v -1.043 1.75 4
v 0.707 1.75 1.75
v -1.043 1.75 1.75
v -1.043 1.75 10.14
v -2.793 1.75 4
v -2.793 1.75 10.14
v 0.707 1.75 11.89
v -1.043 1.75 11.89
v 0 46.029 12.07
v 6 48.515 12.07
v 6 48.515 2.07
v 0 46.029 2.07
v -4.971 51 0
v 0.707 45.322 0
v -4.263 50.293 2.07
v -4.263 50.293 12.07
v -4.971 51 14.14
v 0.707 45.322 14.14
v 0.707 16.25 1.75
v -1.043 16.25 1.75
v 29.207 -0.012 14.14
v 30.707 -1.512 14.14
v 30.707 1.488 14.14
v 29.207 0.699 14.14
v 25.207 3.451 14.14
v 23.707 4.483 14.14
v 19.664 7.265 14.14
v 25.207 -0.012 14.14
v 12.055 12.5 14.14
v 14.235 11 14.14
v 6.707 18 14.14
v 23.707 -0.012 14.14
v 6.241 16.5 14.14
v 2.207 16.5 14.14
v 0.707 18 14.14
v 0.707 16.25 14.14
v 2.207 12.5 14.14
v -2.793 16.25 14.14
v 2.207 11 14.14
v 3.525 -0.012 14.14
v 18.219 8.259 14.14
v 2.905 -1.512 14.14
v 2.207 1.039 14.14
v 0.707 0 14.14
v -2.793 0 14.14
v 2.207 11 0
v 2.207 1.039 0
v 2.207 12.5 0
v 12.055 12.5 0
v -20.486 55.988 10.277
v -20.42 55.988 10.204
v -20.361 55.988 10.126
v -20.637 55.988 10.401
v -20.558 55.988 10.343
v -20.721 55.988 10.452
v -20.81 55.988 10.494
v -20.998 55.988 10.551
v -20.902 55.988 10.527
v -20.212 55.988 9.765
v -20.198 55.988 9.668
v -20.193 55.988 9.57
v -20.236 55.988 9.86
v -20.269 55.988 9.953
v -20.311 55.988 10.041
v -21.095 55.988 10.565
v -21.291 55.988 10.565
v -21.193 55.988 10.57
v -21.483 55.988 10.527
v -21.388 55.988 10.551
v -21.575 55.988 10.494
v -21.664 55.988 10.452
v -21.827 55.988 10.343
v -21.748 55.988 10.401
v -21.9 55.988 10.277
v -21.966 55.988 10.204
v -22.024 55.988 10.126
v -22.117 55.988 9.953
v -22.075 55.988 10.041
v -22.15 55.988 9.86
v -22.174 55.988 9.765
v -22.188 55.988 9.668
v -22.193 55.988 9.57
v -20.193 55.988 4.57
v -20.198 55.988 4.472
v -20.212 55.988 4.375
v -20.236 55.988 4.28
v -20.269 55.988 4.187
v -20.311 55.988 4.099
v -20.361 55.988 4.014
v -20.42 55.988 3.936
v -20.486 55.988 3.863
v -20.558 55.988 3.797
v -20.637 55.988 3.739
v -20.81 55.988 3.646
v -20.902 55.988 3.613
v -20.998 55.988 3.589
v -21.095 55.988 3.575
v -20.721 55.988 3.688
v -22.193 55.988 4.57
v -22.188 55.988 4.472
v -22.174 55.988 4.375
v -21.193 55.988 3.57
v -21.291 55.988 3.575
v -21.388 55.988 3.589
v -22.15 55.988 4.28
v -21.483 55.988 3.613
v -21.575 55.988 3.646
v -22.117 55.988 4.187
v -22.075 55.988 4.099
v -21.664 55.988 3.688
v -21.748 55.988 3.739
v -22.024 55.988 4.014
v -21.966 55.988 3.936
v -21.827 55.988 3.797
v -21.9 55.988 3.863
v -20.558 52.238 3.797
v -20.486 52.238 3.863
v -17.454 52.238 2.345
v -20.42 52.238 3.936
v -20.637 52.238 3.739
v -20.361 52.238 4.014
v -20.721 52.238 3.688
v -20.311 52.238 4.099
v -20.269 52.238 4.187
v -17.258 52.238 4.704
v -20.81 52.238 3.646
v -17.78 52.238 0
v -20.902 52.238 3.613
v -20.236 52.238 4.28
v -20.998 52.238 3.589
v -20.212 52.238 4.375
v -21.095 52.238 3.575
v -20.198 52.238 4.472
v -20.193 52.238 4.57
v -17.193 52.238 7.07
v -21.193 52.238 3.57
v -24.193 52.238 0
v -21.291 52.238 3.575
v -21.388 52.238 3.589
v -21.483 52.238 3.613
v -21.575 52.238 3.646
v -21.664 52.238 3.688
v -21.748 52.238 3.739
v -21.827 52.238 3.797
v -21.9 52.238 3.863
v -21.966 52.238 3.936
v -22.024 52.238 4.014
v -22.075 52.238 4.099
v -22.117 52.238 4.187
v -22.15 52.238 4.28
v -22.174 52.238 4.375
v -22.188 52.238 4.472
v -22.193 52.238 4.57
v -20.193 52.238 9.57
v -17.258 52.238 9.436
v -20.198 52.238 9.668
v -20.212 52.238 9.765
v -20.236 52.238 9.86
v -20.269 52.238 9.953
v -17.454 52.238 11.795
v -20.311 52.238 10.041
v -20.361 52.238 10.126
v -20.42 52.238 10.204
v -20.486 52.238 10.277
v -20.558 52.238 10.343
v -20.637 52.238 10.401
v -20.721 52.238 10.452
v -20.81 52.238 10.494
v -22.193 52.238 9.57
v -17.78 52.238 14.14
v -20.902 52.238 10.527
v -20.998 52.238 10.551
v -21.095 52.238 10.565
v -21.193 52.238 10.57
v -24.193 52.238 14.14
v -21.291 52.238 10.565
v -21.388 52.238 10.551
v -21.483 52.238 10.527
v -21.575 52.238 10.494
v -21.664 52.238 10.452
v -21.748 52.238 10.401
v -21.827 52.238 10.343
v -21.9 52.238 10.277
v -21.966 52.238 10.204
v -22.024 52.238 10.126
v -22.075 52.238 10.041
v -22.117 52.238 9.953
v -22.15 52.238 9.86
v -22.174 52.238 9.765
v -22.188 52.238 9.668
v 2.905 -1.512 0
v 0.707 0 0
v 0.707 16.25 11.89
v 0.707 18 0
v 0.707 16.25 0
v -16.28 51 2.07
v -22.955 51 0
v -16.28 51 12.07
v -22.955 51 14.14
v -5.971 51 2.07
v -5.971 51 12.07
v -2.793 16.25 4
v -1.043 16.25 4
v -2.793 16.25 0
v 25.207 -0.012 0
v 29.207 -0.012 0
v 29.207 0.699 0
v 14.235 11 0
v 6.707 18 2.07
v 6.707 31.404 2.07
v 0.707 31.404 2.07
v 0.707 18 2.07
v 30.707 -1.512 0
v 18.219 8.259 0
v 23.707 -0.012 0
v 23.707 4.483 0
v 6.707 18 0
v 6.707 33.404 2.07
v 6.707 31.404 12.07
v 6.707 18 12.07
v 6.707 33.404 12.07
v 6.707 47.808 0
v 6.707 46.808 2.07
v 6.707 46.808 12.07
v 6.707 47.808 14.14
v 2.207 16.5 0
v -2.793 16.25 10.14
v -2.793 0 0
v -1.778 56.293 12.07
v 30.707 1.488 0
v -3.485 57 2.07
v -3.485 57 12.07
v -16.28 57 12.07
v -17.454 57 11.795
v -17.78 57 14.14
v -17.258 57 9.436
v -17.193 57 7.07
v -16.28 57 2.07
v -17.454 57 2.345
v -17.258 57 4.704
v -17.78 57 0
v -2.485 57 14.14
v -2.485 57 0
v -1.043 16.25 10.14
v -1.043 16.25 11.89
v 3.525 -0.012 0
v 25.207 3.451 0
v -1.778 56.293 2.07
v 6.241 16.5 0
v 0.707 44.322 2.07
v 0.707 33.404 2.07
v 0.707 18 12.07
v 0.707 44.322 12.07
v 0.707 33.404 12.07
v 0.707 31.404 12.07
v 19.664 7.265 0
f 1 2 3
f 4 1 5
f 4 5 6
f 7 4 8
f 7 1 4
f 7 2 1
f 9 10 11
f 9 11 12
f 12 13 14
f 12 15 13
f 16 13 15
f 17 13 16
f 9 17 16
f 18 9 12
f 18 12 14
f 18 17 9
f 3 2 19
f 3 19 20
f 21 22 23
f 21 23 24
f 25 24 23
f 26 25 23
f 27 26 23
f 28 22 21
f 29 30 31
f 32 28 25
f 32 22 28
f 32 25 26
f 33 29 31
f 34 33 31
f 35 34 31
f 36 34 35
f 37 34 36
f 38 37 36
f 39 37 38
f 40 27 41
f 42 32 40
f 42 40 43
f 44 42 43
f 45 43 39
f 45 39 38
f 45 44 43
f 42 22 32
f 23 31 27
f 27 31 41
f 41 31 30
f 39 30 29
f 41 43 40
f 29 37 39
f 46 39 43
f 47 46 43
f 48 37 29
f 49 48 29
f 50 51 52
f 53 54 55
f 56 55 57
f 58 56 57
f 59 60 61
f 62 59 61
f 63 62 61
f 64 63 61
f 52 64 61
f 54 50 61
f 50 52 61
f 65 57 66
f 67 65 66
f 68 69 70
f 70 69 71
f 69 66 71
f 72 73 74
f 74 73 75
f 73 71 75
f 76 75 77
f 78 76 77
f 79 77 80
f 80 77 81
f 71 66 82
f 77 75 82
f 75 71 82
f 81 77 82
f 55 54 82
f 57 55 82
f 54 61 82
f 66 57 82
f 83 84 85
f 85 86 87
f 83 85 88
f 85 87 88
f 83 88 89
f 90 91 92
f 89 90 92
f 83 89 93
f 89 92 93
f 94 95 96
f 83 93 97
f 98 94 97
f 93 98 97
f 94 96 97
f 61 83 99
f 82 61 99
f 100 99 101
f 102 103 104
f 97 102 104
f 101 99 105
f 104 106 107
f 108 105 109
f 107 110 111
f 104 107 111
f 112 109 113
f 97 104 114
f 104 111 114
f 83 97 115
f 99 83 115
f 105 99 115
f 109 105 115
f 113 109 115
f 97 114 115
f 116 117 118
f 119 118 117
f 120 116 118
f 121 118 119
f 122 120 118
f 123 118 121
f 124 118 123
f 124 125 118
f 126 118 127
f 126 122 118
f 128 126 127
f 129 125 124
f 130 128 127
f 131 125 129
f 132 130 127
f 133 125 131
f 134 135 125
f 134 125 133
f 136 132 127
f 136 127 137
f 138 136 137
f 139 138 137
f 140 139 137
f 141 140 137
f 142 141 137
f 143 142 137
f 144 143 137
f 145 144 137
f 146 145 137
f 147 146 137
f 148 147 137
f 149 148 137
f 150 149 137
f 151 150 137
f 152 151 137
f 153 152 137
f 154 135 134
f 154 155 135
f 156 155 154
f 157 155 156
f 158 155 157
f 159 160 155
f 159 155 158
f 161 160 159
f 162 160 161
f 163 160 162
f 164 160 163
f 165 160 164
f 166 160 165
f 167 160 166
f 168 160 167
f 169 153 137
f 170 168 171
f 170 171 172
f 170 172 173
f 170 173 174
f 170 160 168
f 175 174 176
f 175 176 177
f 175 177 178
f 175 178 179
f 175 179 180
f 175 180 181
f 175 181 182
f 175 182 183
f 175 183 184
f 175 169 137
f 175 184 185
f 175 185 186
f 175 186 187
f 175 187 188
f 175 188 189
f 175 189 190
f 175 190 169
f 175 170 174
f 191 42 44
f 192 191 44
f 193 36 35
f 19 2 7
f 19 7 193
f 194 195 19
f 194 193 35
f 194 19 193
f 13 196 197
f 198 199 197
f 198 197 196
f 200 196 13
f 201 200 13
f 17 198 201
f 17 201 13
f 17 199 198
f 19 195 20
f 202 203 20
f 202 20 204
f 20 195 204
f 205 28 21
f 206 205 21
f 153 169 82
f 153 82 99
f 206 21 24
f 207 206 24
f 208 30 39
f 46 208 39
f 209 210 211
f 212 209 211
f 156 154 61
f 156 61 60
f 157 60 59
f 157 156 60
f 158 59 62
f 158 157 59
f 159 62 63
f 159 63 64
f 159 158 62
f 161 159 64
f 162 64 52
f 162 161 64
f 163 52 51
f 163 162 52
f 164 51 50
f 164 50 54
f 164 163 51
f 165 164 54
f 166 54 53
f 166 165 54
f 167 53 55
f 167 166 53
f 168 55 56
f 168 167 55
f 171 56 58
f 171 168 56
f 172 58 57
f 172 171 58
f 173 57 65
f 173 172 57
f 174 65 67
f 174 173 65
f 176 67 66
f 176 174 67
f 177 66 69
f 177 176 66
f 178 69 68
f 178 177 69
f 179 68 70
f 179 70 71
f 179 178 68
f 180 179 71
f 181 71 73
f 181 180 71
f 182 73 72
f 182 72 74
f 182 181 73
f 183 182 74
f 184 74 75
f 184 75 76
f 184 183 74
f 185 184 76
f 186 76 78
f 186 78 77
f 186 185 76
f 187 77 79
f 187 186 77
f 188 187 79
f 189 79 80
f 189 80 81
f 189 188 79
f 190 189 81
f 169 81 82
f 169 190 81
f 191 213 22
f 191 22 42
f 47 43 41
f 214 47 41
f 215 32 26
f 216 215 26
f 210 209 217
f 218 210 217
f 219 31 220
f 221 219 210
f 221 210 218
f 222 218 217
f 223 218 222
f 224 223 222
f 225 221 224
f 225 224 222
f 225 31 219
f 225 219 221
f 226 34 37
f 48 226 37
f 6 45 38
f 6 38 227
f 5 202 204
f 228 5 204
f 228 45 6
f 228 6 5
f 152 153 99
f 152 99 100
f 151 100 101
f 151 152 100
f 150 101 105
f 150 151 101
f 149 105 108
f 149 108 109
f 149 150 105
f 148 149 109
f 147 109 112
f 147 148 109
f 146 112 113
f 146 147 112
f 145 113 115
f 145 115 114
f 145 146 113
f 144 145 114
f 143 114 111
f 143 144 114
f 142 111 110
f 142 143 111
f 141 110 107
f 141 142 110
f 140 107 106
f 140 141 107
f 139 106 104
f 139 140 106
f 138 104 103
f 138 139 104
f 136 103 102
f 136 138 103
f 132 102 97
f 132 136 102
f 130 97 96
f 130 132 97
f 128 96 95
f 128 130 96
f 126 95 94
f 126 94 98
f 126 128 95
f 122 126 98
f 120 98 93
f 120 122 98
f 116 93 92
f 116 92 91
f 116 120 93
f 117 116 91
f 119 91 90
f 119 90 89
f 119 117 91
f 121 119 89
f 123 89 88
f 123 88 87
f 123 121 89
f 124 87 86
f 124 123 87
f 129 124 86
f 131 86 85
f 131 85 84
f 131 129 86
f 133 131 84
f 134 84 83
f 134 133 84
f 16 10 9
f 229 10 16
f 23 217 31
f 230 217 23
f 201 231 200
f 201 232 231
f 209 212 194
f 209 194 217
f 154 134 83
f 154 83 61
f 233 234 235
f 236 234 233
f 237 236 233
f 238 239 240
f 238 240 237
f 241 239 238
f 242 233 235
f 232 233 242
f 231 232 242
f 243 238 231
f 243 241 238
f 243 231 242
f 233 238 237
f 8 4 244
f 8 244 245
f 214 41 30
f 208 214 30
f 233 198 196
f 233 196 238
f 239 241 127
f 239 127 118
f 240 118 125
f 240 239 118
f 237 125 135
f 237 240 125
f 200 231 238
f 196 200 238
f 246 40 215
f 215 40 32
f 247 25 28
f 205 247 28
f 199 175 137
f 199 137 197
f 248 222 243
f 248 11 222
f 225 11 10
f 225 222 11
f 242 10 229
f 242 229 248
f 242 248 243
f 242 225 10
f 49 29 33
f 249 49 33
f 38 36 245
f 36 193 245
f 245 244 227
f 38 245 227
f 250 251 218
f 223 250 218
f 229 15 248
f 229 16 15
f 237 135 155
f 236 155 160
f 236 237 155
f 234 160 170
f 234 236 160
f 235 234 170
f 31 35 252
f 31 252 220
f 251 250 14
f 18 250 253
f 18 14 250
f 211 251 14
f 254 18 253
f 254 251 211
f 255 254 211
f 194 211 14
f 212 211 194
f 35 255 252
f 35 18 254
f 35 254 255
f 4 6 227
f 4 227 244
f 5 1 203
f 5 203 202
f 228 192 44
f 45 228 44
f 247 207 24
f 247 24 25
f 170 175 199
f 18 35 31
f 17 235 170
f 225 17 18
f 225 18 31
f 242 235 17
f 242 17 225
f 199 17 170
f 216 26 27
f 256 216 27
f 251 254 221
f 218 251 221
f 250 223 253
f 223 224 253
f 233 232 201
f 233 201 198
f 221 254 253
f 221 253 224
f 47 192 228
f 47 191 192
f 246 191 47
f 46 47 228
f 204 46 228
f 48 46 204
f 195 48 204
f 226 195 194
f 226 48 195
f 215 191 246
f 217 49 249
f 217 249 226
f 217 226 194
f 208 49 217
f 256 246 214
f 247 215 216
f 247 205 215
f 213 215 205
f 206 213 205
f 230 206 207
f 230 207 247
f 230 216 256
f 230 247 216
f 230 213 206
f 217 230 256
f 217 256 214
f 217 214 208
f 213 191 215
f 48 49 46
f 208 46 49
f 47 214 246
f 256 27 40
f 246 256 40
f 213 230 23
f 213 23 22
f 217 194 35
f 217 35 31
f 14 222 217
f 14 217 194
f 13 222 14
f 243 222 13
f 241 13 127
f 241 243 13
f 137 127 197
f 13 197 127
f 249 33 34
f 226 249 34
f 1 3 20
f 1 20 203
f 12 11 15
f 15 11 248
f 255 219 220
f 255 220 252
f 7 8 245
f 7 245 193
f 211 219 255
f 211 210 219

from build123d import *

# Parameters (mm, degrees)
BOSS_EXTRUDE1_DEPTH = 14.14
CUT_EXTRUDE1_REACH  = 40.3
BOSS_EXTRUDE2_DEPTH = 14.14
BOSS_EXTRUDE8_REACH = 69.576
BOSS_EXTRUDE5_DEPTH = 3.75
SKETCH10_W          = 14.14
SKETCH10_H          = 1.75
BOSS_EXTRUDE6_DEPTH = 3.5
BOSS_EXTRUDE7_DEPTH = 14.5
SKETCH15_W          = 6
SKETCH15_H          = 13.403805922
CUT_EXTRUDE7_DEPTH  = 5


with BuildPart() as part:
    # Sketch1 → Boss-Extrude1 (new body)
    with BuildSketch(Plane.XY):
        Polygon((0.707106781, 0), (0.707106781, 18), (6.707106781, 18), (30.707106781, 1.488209222), (30.707106781, -1.511790778), (2.904504941, -1.511790778), align=None)
    extrude(amount=BOSS_EXTRUDE1_DEPTH)

    # Sketch2 → Cut-Extrude1 (cut, up to next)
    with BuildSketch(Plane.XY.offset(14.14), mode=Mode.PRIVATE) as cut_extrude1_sk1:
        Polygon((2.207106781, 16.5), (2.207106781, 12.5), (12.054974944, 12.5), (6.240947786, 16.5), align=None)
    cut_extrude1_tool1 = extrude(cut_extrude1_sk1.sketch, amount=-CUT_EXTRUDE1_REACH, mode=Mode.PRIVATE) & part.part
    # Sketch2 → Cut-Extrude1 (cut, up to next)
    with BuildSketch(Plane.XY.offset(14.14), mode=Mode.PRIVATE) as cut_extrude1_sk2:
        Polygon((14.235235128, 11), (2.207106781, 11), (2.207106781, 1.039488327), (18.219044647, 8.25917378), align=None)
    cut_extrude1_tool2 = extrude(cut_extrude1_sk2.sketch, amount=-CUT_EXTRUDE1_REACH, mode=Mode.PRIVATE) & part.part
    # Sketch2 → Cut-Extrude1 (cut, up to next)
    with BuildSketch(Plane.XY.offset(14.14), mode=Mode.PRIVATE) as cut_extrude1_sk3:
        Polygon((23.707106781, 4.483434874), (19.663816354, 7.265183441), (3.524822517, -0.011790778), (23.707106781, -0.011790778), align=None)
    cut_extrude1_tool3 = extrude(cut_extrude1_sk3.sketch, amount=-CUT_EXTRUDE1_REACH, mode=Mode.PRIVATE) & part.part
    # Sketch2 → Cut-Extrude1 (cut, up to next)
    with BuildSketch(Plane.XY.offset(14.14), mode=Mode.PRIVATE) as cut_extrude1_sk4:
        Polygon((29.207106781, 0.699482821), (25.207106781, 3.451447951), (25.207106781, -0.011790778), (29.207106781, -0.011790778), align=None)
    cut_extrude1_tool4 = extrude(cut_extrude1_sk4.sketch, amount=-CUT_EXTRUDE1_REACH, mode=Mode.PRIVATE) & part.part
    add(cut_extrude1_tool1.solids().sort_by_distance((5.880456, 14.220782, 14.14))[0], mode=Mode.SUBTRACT)
    add(cut_extrude1_tool2.solids().sort_by_distance((8.231218, 7.334959, 14.14))[0], mode=Mode.SUBTRACT)
    add(cut_extrude1_tool3.solids().sort_by_distance((16.372786, 2.578882, 14.14))[0], mode=Mode.SUBTRACT)
    add(cut_extrude1_tool4.solids().sort_by_distance((26.76762, 1.183019, 14.14))[0], mode=Mode.SUBTRACT)

    # Sketch10 → Boss-Extrude6 (add)
    with BuildSketch(Plane.ZY.offset(-0.707106781)):
        with Locations((7.07, 0.875)):
            Rectangle(SKETCH10_W, SKETCH10_H)
    extrude(amount=BOSS_EXTRUDE6_DEPTH)

    # Sketch11 → Boss-Extrude7 (add)
    with BuildSketch(Plane(origin=(0, 1.75, 0), x_dir=(1, 0, 0), z_dir=(0, 1, 0))):
        Polygon((0.707106781, -14.14), (-2.792893219, -14.14), (-2.792893219, -10.14), (-1.042893219, -10.14), (-1.042893219, -11.89), (0.707106781, -11.89), align=None)
        Polygon((-2.792893219, 0), (0.707106781, 0), (0.707106781, -1.75), (-1.042893219, -1.75), (-1.042893219, -4), (-2.792893219, -4), align=None)
    extrude(amount=BOSS_EXTRUDE7_DEPTH)


with BuildPart() as body_2:
    # Sketch3 → Boss-Extrude2 (new body)
    with BuildSketch(Plane.XY.offset(14.14)):
        Polygon((6.707106781, 47.807611845), (-2.485281374, 57), (-17.192746874, 57), (-17.192746874, 52.238056789), (-24.192746874, 52.238056789), (-22.954690085, 51), (-4.970562748, 51), (0.707106781, 45.32233047), (0.707106781, 18), (6.707106781, 18), align=None)
    extrude(amount=-BOSS_EXTRUDE2_DEPTH)

    # Sketch4 → Boss-Extrude8 (add, up to next)
    with BuildSketch(Plane(origin=(0, 57, 0), x_dir=(1, 0, 0), z_dir=(0, 1, 0)), mode=Mode.PRIVATE) as boss_extrude8_sk1:
        with BuildLine():
            Line((-17.192746874, -14.14), (-17.192746874, -7.069999811))
            ThreePointArc((-17.192746874, -7.069999811), (-17.339728951, -10.617159889), (-17.779667479, -14.14))
            Line((-17.779667479, -14.14), (-17.192746874, -14.14))
        make_face()
    boss_extrude8_tool1 = extrude(boss_extrude8_sk1.sketch, amount=-BOSS_EXTRUDE8_REACH, mode=Mode.PRIVATE) - body_2.part
    # Sketch4 → Boss-Extrude8 (add, up to next)
    with BuildSketch(Plane(origin=(0, 57, 0), x_dir=(1, 0, 0), z_dir=(0, 1, 0)), mode=Mode.PRIVATE) as boss_extrude8_sk2:
        with BuildLine():
            Line((-17.192746874, 0), (-17.779667479, 0))
            ThreePointArc((-17.779667479, 0), (-17.339728967, -3.522839922), (-17.192746874, -7.069999811))
            Line((-17.192746874, -7.069999811), (-17.192746874, 0))
        make_face()
    boss_extrude8_tool2 = extrude(boss_extrude8_sk2.sketch, amount=-BOSS_EXTRUDE8_REACH, mode=Mode.PRIVATE) - body_2.part
    add(boss_extrude8_tool1.solids().sort_by_distance((-17.368615, 57, 12.374929))[0])
    add(boss_extrude8_tool2.solids().sort_by_distance((-17.368615, 57, 1.765071))[0])

    # Sketch9 → Boss-Extrude5 (add)
    with BuildSketch(Plane(origin=(0, 52.238056789, 0), x_dir=(1, 0, 0), z_dir=(0, 1, 0))):
        with BuildLine():
            Line((-20.192746874, -4.57), (-20.192746874, -9.57))
            ThreePointArc((-20.192746874, -9.57), (-21.192746874, -10.57), (-22.192746874, -9.57))
            Line((-22.192746874, -9.57), (-22.192746874, -4.57))
            ThreePointArc((-22.192746874, -4.57), (-21.192746874, -3.57), (-20.192746874, -4.57))
        make_face()
    extrude(amount=BOSS_EXTRUDE5_DEPTH)

    # Sketch15 → Cut-Extrude7 (cut, symmetric)
    with BuildSketch(Plane(origin=(0, 0, 7.07), x_dir=(-1, 0, 0), z_dir=(0, 0, -1))):
        Polygon((16.279667479, 51), (16.279667479, 57), (3.485281374, 57), (5.970562748, 51), align=None)
        Polygon((-6.707106781, 46.807611845), (-0.707106781, 44.32233047), (-0.707106781, 33.403805922), (-6.707106781, 33.403805922), align=None)
        Polygon((-6, 48.514718626), (0, 46.029437252), (4.263455967, 50.292893219), (1.778174593, 56.292893219), align=None)
        with Locations((-3.707106781, 24.701902961)):
            Rectangle(SKETCH15_W, SKETCH15_H)
    extrude(amount=CUT_EXTRUDE7_DEPTH, both=True, mode=Mode.SUBTRACT)


solid = Compound([part.part, body_2.part])
